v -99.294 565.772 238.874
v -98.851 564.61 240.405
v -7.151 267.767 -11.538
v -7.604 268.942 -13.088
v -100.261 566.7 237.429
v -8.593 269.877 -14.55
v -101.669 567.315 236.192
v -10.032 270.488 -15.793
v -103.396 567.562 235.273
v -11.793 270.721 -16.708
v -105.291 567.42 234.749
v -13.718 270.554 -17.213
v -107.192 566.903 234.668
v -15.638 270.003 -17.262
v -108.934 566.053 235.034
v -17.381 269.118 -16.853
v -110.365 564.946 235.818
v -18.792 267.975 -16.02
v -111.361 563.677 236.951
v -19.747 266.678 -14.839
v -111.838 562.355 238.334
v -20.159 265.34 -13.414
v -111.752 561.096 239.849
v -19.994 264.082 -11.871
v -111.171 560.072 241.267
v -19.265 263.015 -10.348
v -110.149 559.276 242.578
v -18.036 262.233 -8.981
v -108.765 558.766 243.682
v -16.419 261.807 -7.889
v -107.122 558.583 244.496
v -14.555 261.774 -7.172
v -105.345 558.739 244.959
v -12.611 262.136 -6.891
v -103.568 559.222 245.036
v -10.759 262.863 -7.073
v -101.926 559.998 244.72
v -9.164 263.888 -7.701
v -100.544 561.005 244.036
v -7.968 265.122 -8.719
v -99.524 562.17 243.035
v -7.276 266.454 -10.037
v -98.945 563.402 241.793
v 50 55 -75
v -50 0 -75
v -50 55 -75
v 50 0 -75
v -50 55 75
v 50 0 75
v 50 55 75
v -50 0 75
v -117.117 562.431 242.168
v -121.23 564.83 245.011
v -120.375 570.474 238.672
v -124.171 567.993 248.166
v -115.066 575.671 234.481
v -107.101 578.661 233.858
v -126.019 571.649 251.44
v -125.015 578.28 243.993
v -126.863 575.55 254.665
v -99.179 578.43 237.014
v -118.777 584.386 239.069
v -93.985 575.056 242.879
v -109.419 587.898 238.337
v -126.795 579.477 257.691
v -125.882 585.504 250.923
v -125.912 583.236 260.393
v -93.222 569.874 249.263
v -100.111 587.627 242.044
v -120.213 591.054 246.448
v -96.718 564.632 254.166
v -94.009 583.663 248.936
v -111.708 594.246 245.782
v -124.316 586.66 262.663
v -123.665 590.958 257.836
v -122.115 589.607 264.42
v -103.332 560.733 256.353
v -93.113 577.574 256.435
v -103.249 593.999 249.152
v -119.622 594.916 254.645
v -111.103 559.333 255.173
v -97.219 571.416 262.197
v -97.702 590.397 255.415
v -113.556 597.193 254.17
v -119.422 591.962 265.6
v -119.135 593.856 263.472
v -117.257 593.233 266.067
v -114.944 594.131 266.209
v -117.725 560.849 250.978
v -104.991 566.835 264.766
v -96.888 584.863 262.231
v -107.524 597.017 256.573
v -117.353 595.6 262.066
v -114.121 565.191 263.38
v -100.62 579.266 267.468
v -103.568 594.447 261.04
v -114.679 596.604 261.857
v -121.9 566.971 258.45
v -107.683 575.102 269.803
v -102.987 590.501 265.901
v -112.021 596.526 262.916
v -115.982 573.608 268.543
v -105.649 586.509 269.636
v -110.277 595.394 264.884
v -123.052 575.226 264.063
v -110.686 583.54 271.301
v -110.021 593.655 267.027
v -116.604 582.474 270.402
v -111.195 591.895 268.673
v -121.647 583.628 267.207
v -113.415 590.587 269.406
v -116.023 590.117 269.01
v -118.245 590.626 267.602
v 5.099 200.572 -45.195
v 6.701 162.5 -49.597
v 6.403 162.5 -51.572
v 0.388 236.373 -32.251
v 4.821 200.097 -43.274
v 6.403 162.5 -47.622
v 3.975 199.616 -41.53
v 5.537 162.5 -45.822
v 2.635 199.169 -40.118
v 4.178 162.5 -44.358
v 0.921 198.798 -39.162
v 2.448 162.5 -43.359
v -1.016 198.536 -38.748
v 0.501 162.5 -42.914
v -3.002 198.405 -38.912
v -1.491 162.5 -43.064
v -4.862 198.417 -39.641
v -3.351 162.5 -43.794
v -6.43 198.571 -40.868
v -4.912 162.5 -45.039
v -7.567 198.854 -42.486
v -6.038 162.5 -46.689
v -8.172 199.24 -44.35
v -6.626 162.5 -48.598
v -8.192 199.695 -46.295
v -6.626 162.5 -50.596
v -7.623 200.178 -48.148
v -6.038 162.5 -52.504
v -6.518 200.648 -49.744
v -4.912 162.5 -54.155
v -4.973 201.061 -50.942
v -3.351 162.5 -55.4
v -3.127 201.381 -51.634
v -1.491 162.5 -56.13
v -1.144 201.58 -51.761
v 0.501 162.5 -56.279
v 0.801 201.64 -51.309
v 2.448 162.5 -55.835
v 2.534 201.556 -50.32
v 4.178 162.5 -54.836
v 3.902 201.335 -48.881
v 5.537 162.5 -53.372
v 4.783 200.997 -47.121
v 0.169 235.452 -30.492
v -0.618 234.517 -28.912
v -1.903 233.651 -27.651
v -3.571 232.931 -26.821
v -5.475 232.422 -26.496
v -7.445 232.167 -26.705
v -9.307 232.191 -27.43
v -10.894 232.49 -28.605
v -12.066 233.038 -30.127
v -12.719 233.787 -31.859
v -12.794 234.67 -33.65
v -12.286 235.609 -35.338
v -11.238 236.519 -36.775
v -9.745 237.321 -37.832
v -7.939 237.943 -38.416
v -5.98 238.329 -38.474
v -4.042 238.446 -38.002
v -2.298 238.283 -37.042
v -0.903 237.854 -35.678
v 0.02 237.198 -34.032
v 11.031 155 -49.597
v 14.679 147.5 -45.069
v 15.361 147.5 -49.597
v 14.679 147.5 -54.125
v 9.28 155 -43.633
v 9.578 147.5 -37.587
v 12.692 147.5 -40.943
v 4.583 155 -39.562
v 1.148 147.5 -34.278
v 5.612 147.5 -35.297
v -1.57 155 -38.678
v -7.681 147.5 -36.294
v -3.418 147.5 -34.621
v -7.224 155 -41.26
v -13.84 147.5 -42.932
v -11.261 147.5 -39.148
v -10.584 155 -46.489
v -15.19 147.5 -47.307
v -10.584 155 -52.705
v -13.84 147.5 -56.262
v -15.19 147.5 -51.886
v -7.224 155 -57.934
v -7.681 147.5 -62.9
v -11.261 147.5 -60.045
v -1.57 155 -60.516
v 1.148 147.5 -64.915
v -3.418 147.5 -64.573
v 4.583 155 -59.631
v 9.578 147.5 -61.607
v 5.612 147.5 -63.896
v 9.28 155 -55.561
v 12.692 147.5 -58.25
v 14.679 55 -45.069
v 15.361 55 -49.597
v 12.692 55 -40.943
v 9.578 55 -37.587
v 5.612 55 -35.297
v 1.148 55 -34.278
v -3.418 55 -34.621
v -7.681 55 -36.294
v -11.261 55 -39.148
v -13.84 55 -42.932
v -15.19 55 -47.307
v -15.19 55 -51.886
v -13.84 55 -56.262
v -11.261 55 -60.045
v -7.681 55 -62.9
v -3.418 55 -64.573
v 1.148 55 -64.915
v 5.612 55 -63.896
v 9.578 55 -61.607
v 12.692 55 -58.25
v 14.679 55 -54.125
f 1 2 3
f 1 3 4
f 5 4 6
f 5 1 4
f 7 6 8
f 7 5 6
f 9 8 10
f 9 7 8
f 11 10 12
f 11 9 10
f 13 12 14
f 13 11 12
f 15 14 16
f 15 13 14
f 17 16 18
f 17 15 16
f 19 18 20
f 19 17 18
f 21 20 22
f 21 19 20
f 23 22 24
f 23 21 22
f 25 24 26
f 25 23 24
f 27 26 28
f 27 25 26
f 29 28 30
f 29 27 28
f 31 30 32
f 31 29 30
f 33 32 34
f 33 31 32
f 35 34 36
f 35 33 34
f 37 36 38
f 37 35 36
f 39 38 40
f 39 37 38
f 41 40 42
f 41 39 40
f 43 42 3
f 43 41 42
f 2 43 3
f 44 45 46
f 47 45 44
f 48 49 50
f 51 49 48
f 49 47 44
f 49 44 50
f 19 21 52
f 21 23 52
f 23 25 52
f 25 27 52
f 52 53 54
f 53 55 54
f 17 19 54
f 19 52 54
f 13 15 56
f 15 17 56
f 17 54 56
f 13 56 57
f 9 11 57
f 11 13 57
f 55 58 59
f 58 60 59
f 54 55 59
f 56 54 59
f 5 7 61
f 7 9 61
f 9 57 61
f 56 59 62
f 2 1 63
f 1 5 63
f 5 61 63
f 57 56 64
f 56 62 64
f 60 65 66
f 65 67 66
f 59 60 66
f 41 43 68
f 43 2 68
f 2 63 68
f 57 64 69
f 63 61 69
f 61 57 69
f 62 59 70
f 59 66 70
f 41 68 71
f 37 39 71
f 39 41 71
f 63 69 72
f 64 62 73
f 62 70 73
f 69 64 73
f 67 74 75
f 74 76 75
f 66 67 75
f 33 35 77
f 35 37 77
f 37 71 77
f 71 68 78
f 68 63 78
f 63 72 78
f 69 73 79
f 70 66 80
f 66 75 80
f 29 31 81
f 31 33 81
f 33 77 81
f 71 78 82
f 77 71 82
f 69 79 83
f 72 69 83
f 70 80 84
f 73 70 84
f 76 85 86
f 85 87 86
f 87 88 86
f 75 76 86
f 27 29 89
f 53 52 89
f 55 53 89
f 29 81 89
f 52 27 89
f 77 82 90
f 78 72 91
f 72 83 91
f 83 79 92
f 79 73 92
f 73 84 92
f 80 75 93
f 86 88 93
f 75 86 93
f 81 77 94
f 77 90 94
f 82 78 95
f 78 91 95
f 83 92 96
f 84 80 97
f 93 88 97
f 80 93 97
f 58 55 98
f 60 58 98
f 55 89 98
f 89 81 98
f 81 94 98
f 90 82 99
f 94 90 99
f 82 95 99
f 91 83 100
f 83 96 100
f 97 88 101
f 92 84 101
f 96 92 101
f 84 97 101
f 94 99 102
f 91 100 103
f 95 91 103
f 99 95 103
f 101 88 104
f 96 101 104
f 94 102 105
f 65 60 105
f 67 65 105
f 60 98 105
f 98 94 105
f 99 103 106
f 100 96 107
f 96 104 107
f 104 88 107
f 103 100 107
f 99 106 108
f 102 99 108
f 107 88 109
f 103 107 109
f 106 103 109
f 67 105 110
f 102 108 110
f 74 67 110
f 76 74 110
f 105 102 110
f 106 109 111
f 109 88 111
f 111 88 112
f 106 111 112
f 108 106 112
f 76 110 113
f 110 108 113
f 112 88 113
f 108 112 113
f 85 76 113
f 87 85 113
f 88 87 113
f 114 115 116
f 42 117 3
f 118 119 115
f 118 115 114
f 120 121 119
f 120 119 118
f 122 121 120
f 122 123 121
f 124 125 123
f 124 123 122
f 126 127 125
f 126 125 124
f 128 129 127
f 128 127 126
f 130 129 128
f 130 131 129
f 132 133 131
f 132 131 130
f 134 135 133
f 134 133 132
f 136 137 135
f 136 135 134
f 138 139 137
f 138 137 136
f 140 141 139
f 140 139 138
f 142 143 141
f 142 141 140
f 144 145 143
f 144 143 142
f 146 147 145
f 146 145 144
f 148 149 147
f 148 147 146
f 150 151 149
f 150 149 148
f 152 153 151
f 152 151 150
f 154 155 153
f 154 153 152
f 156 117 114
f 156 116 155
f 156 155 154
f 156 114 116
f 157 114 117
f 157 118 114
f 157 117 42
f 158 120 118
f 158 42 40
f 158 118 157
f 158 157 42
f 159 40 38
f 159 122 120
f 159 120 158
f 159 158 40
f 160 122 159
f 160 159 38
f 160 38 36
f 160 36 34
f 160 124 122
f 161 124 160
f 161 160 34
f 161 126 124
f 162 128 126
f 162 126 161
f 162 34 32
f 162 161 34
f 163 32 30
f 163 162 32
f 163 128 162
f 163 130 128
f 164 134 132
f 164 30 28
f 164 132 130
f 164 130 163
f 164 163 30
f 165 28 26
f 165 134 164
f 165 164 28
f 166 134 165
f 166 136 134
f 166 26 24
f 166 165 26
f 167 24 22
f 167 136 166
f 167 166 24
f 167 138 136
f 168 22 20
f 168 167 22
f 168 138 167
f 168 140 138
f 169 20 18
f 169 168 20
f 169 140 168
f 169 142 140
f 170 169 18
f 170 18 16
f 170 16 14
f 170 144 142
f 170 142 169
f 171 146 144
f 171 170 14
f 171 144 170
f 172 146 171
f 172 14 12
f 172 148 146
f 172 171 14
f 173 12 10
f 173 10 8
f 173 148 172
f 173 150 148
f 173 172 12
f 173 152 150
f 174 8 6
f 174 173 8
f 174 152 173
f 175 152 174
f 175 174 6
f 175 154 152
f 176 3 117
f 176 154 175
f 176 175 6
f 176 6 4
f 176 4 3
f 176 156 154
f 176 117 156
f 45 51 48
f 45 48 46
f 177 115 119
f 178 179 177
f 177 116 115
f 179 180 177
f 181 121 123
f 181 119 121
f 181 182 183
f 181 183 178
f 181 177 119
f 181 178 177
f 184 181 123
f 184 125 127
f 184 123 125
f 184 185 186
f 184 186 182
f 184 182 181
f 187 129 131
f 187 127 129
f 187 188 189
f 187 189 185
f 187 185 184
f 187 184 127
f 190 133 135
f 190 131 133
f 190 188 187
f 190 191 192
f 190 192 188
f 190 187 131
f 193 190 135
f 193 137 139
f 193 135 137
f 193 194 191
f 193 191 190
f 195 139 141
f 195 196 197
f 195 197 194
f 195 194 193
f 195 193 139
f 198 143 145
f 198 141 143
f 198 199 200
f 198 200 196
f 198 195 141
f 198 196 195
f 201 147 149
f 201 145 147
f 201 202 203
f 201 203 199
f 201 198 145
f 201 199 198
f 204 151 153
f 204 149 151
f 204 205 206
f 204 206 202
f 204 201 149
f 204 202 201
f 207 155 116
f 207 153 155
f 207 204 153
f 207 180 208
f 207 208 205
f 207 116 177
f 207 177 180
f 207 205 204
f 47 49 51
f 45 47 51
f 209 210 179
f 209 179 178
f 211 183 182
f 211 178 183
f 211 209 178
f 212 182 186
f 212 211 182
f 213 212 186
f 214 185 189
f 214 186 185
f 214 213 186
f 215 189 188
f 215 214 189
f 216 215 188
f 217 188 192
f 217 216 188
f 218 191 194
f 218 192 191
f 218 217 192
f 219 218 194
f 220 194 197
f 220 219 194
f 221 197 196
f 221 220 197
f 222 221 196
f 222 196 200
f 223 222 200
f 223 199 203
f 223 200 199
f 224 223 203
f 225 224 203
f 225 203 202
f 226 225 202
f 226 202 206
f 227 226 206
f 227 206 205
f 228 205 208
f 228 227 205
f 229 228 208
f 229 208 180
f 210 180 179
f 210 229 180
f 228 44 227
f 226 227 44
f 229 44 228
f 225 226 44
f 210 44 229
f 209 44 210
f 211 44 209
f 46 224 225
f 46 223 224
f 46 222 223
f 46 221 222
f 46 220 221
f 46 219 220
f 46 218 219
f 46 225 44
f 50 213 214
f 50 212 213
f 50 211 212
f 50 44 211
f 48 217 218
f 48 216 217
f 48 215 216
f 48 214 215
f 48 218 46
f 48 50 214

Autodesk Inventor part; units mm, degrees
ref_plane "YZ Plane" through (0, 0, 0) normal (1, 0, 0) x (0, 1, 0)
ref_plane "XZ Plane" through (0, 0, 0) normal (0, 1, 0) x (-1, 0, 0)
ref_plane "XY Plane" through (0, 0, 0) normal (0, 0, 1) x (1, 0, 0)
sketch "草圖1" plane through (0, 0, 0) normal (0, 1, 0) x (-1, 0, 0)
  line L0 (-50, 75) -> (50, 75)
  line L1 (50, 75) -> (50, -75)
  line L2 (50, -75) -> (-50, -75)
  line L3 (-50, -75) -> (-50, 75)
  line L4 (-50, 75) -> (50, -75) construction
  line L5 (50, 75) -> (-50, -75) construction
  point P0 (0, 0)
  dimension "d0" = 100
  dimension "d1" = 150
extrude "擠出1" add sketch "草圖1" along normal blind 55
sketch "草圖2" plane through (0, 55, 0) normal (0, 1, 0) x (1, 0, 0)
  circle A0 centre (0, 49.596879) radius 15.361397
  point P0 (0, 0)
extrude "擠出2" add sketch "草圖2" along normal blind 92.5
sketch "草圖3" plane through (0, 147.5, -49.596879) normal (0, 1, 0) x (1, 0, 0)
  circle A0 centre (0, 0) radius 15.361397
  point P0 (0, -49.596879)
extrude "擠出3" add sketch "草圖3" along normal blind 15 draft -30
sketch "草圖8" plane through (0, 162.5, -49.596879) normal (0, 1, 0) x (1, 0, 0)
  circle A0 centre (0, 0) radius 6.701143
  line L0 (0, 0) -> (-74.851571, -205.653002)
  line L1 (0, 0) -> (218.851354, 0) construction
  point P0 (0, -49.596879)
  dimension "d14" = 110
surface extrude "擠出表面2" sketch "草圖8" along normal blind 8 shown no curves L0
sketch "草圖4" plane through (-14.690503, 0, -9.235054) normal (0.9396926, 0, 0.3420201) x (0, 1, 0)
  line L0 (55, -69.985594) -> (0, -69.985594) construction
  line L1 (0, -69.985594) -> (0, 89.641072) construction
  line L2 (55, 89.641072) -> (55, -27.590761) construction
  line L3 (55, -27.590761) -> (147.5, -27.590761) construction
  line L4 (147.5, -27.590761) -> (162.5, -36.251015) construction
  line L5 (162.5, -36.251015) -> (162.5, -49.6533) construction
  line L6 (162.5, -49.6533) -> (147.5, -58.313554) construction
  line L7 (147.5, -58.313554) -> (55, -58.313554) construction
  line L8 (55, -58.313554) -> (55, -69.985594) construction
  line L9 (162.5, -36.251015) -> (162.5, -49.6533) construction
  arc A0 (162.5, -42.952157) -> (266.230331, -3.041729) centre (162.5, 111.804689) ccw
  line L10 (266.230331, -3.041729) -> (563.073853, 265.070045)
  line L11 (0, 89.641072) -> (55, 89.641072)
  point P0 (0, 3.653664)
  dimension "d8" = 400
sketch "草圖5" plane through (0, 162.5, -49.596879) normal (0, 1, 0) x (1, 0, 0)
  circle A0 centre (0, 0) radius 6.701143
  point P0 (0, -49.596879)
sweep "掃掠1" add profiles "草圖5" path "草圖4" path curves A0 L10
sketch "草圖6" plane through (-105.349798, 563.073853, 239.849311) normal (-0.2292491, 0.7421088, 0.6298566) x (0.9554499, 0.2951535, 0)
  circle A0 centre (0, 0) radius 6.701143
  circle A1 centre (0, 0) radius 6.701143
  line L0 (-6.701143, 0) -> (6.701143, 0)
  point P0 (-65.536753, -172.147129)
  point P1 (0, 0)
surface extrude "擠出表面1" sketch "草圖6" along normal blind 8 shown yes curves L0
sketch "草圖7" plane through (-98.947192, 565.051719, 239.849311) normal (-0.1859044, 0.6017964, -0.7767114) x (-0.9554499, -0.2951535, 0)
  line L0 (13.402285, 0) -> (0, 0)
  line L1 (13.402285, 0) -> (0, 0)
  spline S0 degree 4 poles (13.402285, 0) (44.904659, 17.87413) (4.281315, 87.58342) (-27.060021, 18.156606) (0, 0) knots 0 0 0 0 0 1 1 1 1 1
  line L2 (6.701143, 41.850443) -> (6.701143, 0)
  line L3 (13.402285, 0) -> (0, 0)
  point P0 (72.237896, -593.084089)
  point P1 (21.56931, 30.293196)
  point P2 (-7.261182, 30.293196)
revolve "迴轉1" add sketch "草圖7" angle 360 about axis through (-114.943973, 594.131436, 266.20909) along (0.2292491, -0.7421088, -0.6298566) picked at (11.989428, 23.179775) contours L0 L2 S0
properties part number "無線麥克風組"
